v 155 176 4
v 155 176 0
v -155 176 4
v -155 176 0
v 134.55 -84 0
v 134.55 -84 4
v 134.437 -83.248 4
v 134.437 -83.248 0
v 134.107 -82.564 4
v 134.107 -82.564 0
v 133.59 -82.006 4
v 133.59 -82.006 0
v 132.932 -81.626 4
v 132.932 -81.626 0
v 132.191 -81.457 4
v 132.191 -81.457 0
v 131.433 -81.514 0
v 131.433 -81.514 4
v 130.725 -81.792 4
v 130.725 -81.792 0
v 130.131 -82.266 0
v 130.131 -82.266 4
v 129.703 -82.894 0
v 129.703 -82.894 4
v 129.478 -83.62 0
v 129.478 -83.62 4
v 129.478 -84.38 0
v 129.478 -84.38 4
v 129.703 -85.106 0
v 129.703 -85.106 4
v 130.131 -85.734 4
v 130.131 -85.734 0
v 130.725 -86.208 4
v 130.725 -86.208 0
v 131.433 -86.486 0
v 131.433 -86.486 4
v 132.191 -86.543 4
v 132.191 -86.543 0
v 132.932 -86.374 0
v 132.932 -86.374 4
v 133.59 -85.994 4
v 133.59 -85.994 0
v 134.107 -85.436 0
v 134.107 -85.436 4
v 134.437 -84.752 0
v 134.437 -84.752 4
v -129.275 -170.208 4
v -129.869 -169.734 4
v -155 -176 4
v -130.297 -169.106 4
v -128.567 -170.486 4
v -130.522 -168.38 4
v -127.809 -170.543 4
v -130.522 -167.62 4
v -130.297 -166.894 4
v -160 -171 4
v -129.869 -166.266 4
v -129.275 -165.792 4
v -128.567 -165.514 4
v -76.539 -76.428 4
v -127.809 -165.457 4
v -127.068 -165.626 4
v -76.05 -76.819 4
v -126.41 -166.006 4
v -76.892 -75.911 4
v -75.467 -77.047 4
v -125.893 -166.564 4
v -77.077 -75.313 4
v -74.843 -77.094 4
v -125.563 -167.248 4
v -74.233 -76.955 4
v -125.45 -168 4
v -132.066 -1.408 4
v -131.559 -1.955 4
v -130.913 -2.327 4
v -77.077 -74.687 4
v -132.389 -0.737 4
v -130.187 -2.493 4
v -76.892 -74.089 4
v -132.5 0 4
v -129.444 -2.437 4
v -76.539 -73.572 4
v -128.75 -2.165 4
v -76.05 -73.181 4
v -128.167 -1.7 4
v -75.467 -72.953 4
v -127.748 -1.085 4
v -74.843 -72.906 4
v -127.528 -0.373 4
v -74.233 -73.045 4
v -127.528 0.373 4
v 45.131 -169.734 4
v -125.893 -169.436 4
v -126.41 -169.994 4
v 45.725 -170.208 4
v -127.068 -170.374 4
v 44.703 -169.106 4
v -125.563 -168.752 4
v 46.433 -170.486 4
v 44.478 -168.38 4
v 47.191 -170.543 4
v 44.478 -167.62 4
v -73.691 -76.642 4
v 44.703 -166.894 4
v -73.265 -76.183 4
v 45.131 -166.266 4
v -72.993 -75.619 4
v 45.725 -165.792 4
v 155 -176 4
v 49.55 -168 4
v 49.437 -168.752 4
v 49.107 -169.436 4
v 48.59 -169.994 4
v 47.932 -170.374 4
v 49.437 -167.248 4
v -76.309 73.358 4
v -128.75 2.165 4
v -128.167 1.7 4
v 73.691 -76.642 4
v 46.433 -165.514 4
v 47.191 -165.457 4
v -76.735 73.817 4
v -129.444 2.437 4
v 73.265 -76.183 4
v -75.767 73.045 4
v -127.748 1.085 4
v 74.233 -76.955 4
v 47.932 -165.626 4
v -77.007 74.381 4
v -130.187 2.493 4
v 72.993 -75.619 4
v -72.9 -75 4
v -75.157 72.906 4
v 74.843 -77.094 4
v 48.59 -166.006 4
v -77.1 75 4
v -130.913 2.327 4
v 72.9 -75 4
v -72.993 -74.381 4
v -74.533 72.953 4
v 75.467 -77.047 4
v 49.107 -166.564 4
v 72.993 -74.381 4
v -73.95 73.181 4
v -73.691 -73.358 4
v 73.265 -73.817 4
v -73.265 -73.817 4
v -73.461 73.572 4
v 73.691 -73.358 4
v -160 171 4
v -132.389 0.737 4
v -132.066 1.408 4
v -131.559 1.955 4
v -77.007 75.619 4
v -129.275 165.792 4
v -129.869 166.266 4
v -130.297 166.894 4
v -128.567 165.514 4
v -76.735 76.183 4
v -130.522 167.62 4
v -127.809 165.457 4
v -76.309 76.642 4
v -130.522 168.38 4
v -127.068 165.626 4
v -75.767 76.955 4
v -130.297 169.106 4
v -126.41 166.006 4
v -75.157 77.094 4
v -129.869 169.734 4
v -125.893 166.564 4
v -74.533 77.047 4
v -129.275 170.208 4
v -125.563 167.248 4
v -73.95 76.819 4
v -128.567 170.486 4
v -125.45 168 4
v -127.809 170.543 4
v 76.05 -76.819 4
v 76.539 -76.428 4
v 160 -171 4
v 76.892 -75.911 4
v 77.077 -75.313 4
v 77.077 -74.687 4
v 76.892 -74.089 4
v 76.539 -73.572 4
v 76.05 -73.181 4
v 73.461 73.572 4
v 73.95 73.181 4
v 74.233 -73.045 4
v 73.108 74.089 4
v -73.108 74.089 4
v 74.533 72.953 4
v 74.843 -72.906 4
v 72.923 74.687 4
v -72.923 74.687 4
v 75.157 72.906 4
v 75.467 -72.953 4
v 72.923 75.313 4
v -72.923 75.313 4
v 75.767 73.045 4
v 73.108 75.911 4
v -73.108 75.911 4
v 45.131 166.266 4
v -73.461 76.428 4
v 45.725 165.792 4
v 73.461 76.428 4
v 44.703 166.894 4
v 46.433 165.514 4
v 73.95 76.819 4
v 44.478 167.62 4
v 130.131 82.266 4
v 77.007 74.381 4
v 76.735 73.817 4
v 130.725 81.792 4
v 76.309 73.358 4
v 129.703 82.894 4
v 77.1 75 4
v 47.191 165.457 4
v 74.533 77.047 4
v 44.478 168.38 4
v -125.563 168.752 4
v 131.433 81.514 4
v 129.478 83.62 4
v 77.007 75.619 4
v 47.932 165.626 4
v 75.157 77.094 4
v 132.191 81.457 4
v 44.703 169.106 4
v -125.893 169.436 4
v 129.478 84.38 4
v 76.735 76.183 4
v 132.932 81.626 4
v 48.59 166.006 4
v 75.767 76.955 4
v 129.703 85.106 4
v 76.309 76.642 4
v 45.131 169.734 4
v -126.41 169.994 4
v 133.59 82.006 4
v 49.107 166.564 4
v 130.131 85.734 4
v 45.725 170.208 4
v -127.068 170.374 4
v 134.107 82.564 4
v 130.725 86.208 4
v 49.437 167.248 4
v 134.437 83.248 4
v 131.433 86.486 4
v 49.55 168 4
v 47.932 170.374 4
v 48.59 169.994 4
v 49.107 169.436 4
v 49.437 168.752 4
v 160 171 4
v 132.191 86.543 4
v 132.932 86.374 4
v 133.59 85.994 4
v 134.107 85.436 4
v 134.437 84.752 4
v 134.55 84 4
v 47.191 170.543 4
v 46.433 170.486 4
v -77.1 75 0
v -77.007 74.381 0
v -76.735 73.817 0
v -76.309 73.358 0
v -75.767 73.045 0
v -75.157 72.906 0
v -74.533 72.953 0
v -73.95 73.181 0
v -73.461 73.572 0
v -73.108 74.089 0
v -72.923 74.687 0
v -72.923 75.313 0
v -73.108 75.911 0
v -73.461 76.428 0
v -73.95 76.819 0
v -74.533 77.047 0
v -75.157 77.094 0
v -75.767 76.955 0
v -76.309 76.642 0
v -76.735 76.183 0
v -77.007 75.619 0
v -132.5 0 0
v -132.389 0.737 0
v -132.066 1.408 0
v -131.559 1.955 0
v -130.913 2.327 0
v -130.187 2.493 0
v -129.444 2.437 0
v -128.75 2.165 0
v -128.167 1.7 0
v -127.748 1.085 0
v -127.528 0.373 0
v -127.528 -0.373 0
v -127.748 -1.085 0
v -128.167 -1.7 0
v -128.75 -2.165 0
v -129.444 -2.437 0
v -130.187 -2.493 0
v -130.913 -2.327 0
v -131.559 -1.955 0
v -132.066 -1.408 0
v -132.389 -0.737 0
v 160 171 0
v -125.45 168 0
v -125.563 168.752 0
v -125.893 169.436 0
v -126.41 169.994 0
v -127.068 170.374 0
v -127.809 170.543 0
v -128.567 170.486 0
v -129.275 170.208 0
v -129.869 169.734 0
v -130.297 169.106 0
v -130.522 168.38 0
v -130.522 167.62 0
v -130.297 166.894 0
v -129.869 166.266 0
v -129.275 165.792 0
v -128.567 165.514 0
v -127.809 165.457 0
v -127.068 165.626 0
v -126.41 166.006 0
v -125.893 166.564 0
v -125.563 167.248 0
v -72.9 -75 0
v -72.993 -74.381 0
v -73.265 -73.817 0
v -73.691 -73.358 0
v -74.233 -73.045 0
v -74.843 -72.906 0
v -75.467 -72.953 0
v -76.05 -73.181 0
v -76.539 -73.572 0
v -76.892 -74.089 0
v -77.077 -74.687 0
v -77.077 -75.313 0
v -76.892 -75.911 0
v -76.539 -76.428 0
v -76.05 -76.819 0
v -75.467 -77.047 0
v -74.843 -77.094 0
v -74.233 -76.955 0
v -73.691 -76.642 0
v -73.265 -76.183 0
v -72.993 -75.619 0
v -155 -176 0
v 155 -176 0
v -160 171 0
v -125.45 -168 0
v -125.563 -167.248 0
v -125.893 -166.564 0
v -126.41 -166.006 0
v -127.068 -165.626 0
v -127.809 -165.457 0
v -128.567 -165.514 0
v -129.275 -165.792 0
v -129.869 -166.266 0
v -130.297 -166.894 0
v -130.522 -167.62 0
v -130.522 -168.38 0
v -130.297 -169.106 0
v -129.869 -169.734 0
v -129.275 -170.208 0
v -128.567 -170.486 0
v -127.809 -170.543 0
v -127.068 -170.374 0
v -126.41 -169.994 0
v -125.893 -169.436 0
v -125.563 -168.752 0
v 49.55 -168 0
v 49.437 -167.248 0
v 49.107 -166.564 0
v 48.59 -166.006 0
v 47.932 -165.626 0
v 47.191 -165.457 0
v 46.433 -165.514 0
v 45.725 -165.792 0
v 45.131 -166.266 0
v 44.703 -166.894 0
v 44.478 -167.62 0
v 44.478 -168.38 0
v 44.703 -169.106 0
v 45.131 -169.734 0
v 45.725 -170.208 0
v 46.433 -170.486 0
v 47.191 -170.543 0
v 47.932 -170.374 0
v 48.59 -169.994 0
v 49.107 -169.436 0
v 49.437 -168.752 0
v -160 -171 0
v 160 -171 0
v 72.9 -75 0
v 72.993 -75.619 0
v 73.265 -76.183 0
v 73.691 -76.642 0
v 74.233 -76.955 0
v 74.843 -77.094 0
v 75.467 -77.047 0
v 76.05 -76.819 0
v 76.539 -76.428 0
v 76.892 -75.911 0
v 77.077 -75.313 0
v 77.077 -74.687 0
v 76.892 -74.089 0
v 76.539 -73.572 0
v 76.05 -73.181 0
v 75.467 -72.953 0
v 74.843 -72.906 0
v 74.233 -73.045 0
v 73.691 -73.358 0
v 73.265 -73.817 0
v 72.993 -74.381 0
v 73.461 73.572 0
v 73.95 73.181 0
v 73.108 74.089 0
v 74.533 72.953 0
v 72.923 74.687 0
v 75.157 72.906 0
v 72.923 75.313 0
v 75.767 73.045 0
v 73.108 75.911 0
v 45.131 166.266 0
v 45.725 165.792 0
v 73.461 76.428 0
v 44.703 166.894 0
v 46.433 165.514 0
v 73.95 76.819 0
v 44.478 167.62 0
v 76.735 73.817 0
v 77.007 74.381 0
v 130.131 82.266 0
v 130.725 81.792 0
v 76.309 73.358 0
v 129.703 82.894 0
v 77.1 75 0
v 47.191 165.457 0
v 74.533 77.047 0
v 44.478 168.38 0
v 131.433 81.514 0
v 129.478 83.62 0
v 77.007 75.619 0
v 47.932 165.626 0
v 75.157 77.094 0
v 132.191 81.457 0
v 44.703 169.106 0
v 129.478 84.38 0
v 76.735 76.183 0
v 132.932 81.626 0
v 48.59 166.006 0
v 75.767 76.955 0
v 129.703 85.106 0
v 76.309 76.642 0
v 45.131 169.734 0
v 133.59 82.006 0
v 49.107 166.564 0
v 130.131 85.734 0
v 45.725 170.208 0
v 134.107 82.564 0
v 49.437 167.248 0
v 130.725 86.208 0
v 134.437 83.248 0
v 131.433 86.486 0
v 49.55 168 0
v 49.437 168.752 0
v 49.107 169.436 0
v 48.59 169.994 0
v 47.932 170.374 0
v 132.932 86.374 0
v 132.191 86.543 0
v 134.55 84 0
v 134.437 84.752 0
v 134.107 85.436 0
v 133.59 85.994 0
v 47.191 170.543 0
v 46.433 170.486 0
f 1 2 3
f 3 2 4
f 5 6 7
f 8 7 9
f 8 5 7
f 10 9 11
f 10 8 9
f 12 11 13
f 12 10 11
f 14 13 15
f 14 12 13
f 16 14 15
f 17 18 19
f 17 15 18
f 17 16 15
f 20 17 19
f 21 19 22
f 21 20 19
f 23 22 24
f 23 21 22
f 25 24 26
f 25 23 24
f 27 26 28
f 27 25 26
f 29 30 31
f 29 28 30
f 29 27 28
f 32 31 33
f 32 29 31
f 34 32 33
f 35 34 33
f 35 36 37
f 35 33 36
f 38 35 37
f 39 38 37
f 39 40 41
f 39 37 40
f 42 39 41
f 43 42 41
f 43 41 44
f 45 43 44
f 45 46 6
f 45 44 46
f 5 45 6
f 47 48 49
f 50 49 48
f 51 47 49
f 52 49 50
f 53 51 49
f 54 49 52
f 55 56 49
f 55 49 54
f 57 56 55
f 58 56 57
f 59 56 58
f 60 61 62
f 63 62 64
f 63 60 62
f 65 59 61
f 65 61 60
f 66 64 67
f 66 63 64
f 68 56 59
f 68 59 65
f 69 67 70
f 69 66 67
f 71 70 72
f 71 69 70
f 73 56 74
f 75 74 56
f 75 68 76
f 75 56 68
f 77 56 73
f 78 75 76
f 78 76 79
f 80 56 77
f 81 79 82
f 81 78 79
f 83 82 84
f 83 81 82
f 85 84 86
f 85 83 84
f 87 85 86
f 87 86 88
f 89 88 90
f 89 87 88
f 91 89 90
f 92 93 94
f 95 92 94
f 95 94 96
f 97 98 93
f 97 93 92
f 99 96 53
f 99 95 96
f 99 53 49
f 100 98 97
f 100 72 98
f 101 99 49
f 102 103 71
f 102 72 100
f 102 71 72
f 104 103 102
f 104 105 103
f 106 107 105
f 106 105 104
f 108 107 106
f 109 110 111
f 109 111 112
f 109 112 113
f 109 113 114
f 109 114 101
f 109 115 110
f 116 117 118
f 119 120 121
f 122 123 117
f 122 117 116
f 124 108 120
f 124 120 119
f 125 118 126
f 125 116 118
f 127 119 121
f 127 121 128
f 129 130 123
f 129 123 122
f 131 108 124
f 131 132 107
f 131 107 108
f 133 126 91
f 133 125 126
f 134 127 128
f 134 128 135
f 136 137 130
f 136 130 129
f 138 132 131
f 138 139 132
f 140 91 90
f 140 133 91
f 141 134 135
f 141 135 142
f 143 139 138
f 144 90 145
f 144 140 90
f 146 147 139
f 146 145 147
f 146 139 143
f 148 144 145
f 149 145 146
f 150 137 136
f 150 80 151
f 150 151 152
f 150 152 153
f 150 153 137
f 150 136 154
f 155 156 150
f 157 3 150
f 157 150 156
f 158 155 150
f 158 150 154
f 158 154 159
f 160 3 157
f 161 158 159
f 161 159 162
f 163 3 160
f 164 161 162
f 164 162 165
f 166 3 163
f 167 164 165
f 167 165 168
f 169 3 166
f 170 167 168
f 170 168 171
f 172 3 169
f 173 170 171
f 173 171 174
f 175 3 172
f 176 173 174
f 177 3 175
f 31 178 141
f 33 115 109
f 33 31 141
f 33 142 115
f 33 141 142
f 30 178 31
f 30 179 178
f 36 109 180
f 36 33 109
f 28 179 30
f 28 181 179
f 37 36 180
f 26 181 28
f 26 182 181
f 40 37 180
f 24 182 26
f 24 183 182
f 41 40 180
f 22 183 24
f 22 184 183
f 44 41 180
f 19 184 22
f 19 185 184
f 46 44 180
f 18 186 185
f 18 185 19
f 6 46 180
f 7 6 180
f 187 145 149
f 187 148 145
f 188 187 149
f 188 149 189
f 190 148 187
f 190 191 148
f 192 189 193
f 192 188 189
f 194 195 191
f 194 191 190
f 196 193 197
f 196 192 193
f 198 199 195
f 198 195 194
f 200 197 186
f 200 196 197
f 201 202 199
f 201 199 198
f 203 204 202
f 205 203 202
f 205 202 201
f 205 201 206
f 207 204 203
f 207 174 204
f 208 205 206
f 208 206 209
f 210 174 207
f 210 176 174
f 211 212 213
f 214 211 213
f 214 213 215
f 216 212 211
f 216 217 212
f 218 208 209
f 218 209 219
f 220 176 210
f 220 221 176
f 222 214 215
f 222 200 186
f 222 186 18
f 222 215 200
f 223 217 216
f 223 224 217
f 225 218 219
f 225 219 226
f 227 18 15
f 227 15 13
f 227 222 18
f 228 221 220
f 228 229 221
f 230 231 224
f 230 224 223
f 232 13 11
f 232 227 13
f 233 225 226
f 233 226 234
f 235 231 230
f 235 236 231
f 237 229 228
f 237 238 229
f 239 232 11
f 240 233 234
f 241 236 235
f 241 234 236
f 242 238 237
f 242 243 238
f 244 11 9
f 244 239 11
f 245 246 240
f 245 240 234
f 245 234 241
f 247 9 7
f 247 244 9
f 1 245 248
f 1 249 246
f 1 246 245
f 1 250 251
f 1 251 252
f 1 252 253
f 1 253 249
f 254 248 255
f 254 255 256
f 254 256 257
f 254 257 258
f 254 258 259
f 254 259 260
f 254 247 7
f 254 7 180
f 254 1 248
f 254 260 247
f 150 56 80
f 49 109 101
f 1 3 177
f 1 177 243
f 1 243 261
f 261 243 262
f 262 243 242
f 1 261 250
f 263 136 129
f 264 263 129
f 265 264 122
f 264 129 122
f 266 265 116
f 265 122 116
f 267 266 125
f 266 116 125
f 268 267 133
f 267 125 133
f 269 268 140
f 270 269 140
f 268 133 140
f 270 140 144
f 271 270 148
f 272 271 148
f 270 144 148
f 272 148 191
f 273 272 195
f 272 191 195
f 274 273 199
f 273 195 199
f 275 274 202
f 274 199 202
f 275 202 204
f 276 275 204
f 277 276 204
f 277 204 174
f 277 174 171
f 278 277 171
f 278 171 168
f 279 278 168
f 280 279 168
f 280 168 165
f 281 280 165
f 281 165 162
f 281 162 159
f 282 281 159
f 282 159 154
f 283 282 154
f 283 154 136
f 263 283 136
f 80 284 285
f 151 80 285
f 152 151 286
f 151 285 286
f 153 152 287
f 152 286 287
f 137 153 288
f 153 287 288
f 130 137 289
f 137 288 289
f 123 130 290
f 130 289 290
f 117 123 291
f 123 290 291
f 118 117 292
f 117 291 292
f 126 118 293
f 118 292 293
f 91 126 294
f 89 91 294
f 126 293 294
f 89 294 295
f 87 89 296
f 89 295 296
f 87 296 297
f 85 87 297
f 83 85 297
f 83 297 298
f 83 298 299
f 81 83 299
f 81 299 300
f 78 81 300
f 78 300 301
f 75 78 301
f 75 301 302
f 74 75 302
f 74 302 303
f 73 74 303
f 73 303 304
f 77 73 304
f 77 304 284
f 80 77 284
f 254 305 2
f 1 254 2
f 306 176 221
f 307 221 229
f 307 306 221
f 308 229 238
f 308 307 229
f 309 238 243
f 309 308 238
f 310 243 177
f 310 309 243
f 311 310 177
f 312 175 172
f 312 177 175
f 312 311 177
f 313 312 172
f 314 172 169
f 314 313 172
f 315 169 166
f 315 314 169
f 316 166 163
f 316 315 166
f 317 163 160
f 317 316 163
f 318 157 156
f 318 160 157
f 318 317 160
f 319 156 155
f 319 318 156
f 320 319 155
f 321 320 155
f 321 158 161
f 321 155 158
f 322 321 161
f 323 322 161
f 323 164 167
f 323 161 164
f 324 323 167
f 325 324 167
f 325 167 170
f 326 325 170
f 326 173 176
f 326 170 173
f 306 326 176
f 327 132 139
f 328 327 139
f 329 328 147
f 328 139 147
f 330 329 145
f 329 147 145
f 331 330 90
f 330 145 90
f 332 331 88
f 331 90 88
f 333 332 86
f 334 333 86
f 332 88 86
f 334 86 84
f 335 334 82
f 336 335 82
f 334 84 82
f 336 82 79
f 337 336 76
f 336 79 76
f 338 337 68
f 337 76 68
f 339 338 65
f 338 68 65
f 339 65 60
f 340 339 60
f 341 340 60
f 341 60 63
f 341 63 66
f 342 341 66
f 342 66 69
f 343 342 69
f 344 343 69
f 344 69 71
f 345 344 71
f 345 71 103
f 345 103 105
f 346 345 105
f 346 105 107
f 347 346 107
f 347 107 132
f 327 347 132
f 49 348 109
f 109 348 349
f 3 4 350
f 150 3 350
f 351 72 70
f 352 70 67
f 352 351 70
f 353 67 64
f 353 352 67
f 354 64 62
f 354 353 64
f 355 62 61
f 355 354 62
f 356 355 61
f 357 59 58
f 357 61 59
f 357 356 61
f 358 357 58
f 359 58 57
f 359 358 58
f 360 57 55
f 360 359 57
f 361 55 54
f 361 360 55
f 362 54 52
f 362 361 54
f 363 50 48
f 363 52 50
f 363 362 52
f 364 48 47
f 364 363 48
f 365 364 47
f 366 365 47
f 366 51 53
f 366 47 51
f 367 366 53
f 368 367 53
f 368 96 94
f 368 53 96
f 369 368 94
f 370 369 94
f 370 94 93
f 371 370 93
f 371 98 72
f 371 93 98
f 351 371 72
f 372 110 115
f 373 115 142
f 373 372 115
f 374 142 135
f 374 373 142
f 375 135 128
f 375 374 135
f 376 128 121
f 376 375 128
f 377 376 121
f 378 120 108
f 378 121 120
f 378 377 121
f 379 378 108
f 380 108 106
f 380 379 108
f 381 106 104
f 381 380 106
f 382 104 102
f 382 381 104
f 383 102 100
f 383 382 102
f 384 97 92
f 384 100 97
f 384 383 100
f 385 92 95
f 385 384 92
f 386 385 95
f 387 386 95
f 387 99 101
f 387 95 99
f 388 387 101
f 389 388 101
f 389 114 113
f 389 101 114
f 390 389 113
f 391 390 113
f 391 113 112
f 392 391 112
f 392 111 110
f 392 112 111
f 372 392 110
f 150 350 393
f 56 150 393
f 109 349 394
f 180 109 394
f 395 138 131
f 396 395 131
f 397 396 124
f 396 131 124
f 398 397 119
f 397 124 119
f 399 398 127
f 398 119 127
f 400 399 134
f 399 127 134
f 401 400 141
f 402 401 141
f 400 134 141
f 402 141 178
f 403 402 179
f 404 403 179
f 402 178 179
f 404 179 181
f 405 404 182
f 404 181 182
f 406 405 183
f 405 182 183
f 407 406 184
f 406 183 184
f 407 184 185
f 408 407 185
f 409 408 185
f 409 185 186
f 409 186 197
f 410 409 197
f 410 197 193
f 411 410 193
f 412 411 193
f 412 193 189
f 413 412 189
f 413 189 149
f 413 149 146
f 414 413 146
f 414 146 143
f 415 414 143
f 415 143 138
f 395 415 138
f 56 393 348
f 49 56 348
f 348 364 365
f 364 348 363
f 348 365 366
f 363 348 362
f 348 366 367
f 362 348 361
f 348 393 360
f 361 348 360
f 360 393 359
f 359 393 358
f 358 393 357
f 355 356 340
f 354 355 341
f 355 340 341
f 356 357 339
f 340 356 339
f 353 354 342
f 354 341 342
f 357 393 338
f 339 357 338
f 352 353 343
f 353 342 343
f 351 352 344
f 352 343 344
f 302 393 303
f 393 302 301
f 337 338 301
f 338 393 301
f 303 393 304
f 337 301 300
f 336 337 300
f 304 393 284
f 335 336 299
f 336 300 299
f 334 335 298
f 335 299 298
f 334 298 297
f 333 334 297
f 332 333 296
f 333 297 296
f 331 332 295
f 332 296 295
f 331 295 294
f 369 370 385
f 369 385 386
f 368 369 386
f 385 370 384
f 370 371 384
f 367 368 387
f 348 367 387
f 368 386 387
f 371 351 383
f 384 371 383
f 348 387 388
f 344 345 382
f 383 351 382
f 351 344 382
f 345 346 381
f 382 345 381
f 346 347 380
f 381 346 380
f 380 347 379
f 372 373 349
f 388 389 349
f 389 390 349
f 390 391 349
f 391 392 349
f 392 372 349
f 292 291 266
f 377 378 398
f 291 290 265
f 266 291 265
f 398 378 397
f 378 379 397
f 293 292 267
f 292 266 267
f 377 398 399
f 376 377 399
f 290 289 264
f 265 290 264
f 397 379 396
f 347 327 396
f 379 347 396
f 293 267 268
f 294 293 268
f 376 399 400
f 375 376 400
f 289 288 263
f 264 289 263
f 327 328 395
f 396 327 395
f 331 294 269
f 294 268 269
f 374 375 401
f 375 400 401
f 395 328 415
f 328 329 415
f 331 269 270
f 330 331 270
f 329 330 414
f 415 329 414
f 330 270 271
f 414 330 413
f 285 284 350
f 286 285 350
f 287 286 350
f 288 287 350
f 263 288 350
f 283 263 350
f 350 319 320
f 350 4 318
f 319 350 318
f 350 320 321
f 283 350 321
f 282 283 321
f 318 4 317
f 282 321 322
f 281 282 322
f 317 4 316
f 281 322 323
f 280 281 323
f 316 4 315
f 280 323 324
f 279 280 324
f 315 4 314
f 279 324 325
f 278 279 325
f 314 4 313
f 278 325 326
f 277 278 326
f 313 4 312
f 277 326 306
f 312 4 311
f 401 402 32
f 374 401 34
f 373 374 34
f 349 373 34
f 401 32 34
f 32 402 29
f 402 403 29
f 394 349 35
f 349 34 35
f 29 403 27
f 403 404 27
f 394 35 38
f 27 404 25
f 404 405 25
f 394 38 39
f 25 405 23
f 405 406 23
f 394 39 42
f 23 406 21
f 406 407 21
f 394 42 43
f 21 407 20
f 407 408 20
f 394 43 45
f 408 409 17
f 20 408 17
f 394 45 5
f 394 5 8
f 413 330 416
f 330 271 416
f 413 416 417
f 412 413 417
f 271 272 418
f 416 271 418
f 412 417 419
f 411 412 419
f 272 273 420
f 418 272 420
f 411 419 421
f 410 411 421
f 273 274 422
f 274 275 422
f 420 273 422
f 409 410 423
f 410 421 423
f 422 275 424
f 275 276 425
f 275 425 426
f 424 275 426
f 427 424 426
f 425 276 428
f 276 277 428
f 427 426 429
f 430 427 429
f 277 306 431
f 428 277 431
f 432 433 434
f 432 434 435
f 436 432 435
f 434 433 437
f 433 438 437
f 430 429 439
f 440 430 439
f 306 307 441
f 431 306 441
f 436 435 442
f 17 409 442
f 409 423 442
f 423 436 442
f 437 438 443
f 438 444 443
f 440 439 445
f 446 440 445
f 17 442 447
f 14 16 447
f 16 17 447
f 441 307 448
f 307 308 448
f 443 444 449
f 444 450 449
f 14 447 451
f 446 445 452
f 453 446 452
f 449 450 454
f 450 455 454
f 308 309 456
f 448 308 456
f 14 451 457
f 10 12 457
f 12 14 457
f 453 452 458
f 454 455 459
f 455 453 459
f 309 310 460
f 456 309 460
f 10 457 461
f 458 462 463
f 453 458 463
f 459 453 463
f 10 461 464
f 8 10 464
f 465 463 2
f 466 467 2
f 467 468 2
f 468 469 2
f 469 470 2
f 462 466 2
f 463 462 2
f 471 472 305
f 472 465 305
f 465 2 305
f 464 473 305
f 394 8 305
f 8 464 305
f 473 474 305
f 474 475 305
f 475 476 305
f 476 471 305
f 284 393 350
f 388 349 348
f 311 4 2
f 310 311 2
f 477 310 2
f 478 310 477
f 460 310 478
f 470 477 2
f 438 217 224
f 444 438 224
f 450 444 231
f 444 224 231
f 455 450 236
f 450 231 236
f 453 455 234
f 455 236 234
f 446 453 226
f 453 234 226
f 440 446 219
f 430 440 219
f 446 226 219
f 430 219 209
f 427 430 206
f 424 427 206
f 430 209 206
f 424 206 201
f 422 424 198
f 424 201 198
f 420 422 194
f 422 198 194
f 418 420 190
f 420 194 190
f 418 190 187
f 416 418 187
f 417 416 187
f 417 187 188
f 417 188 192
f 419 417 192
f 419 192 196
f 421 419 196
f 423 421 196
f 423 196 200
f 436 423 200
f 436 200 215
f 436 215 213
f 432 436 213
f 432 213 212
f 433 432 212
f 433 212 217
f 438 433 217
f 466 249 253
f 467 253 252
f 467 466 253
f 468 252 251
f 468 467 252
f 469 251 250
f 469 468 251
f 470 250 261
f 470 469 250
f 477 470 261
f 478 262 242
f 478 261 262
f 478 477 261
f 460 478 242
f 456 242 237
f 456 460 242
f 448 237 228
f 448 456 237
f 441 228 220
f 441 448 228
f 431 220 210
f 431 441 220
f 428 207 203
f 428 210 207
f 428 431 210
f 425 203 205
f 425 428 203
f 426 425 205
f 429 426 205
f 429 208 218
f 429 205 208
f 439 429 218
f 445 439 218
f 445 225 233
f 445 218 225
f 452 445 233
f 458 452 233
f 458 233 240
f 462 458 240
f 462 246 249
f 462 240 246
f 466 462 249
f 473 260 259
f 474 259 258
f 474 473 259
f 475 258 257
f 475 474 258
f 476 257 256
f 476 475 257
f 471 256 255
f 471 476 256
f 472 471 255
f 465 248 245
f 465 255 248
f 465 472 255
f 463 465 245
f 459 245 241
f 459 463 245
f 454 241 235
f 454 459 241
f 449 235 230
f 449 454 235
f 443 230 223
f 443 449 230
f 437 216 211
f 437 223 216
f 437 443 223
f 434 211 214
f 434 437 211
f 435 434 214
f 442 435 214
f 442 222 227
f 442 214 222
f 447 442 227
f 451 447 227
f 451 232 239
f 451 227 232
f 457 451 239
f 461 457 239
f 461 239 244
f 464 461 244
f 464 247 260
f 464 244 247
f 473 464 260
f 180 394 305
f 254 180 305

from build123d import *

# Parameters (mm, degrees)
BASE_DEPTH         = 4
SKETCH3_R          = 2.5
FITTINGHOLE_DEPTH  = 238.890731219
SKETCH4_R          = 2.55
CUT_EXTRUDE2_DEPTH = 238.890731219
SKETCH5_R          = 2.1
CUT_EXTRUDE3_DEPTH = 238.890731219


with BuildPart() as part:
    # Sketch1 → Base (new body)
    with BuildSketch(Plane.XY):
        Polygon((-155, 176), (-160, 171), (-160, -171), (-155, -176), (155, -176), (160, -171), (160, 171), (155, 176), align=None)
    extrude(amount=BASE_DEPTH)

    # Sketch3 → FittingHole (cut, through all)
    with BuildSketch(Plane(origin=(0, 0, 0), x_dir=(-1, 0, 0), z_dir=(0, 0, -1))):
        with Locations((130, 0)):
            Circle(SKETCH3_R)
    extrude(amount=-FITTINGHOLE_DEPTH, mode=Mode.SUBTRACT)

    # Sketch4 → Cut-Extrude2 (cut, through all)
    with BuildSketch(Plane.XY):
        with Locations((-128, 168)):
            Circle(SKETCH4_R)
        with Locations((47, 168)):
            Circle(SKETCH4_R)
        with Locations((132, 84)):
            Circle(SKETCH4_R)
        with Locations((132, -84)):
            Circle(SKETCH4_R)
        with Locations((47, -168)):
            Circle(SKETCH4_R)
        with Locations((-128, -168)):
            Circle(SKETCH4_R)
    extrude(amount=CUT_EXTRUDE2_DEPTH, mode=Mode.SUBTRACT)

    # Sketch5 → Cut-Extrude3 (cut, through all)
    with BuildSketch(Plane.XY.offset(4)):
        with Locations((-75, -75)):
            Circle(SKETCH5_R)
        with Locations(Location((75, -75, 0), (0, 0, 180))):
            Circle(SKETCH5_R)
        with Locations((75, 75)):
            Circle(SKETCH5_R)
        with Locations(Location((-75, 75, 0), (0, 0, 180))):
            Circle(SKETCH5_R)
    extrude(amount=-CUT_EXTRUDE3_DEPTH, mode=Mode.SUBTRACT)


solid = part.part
